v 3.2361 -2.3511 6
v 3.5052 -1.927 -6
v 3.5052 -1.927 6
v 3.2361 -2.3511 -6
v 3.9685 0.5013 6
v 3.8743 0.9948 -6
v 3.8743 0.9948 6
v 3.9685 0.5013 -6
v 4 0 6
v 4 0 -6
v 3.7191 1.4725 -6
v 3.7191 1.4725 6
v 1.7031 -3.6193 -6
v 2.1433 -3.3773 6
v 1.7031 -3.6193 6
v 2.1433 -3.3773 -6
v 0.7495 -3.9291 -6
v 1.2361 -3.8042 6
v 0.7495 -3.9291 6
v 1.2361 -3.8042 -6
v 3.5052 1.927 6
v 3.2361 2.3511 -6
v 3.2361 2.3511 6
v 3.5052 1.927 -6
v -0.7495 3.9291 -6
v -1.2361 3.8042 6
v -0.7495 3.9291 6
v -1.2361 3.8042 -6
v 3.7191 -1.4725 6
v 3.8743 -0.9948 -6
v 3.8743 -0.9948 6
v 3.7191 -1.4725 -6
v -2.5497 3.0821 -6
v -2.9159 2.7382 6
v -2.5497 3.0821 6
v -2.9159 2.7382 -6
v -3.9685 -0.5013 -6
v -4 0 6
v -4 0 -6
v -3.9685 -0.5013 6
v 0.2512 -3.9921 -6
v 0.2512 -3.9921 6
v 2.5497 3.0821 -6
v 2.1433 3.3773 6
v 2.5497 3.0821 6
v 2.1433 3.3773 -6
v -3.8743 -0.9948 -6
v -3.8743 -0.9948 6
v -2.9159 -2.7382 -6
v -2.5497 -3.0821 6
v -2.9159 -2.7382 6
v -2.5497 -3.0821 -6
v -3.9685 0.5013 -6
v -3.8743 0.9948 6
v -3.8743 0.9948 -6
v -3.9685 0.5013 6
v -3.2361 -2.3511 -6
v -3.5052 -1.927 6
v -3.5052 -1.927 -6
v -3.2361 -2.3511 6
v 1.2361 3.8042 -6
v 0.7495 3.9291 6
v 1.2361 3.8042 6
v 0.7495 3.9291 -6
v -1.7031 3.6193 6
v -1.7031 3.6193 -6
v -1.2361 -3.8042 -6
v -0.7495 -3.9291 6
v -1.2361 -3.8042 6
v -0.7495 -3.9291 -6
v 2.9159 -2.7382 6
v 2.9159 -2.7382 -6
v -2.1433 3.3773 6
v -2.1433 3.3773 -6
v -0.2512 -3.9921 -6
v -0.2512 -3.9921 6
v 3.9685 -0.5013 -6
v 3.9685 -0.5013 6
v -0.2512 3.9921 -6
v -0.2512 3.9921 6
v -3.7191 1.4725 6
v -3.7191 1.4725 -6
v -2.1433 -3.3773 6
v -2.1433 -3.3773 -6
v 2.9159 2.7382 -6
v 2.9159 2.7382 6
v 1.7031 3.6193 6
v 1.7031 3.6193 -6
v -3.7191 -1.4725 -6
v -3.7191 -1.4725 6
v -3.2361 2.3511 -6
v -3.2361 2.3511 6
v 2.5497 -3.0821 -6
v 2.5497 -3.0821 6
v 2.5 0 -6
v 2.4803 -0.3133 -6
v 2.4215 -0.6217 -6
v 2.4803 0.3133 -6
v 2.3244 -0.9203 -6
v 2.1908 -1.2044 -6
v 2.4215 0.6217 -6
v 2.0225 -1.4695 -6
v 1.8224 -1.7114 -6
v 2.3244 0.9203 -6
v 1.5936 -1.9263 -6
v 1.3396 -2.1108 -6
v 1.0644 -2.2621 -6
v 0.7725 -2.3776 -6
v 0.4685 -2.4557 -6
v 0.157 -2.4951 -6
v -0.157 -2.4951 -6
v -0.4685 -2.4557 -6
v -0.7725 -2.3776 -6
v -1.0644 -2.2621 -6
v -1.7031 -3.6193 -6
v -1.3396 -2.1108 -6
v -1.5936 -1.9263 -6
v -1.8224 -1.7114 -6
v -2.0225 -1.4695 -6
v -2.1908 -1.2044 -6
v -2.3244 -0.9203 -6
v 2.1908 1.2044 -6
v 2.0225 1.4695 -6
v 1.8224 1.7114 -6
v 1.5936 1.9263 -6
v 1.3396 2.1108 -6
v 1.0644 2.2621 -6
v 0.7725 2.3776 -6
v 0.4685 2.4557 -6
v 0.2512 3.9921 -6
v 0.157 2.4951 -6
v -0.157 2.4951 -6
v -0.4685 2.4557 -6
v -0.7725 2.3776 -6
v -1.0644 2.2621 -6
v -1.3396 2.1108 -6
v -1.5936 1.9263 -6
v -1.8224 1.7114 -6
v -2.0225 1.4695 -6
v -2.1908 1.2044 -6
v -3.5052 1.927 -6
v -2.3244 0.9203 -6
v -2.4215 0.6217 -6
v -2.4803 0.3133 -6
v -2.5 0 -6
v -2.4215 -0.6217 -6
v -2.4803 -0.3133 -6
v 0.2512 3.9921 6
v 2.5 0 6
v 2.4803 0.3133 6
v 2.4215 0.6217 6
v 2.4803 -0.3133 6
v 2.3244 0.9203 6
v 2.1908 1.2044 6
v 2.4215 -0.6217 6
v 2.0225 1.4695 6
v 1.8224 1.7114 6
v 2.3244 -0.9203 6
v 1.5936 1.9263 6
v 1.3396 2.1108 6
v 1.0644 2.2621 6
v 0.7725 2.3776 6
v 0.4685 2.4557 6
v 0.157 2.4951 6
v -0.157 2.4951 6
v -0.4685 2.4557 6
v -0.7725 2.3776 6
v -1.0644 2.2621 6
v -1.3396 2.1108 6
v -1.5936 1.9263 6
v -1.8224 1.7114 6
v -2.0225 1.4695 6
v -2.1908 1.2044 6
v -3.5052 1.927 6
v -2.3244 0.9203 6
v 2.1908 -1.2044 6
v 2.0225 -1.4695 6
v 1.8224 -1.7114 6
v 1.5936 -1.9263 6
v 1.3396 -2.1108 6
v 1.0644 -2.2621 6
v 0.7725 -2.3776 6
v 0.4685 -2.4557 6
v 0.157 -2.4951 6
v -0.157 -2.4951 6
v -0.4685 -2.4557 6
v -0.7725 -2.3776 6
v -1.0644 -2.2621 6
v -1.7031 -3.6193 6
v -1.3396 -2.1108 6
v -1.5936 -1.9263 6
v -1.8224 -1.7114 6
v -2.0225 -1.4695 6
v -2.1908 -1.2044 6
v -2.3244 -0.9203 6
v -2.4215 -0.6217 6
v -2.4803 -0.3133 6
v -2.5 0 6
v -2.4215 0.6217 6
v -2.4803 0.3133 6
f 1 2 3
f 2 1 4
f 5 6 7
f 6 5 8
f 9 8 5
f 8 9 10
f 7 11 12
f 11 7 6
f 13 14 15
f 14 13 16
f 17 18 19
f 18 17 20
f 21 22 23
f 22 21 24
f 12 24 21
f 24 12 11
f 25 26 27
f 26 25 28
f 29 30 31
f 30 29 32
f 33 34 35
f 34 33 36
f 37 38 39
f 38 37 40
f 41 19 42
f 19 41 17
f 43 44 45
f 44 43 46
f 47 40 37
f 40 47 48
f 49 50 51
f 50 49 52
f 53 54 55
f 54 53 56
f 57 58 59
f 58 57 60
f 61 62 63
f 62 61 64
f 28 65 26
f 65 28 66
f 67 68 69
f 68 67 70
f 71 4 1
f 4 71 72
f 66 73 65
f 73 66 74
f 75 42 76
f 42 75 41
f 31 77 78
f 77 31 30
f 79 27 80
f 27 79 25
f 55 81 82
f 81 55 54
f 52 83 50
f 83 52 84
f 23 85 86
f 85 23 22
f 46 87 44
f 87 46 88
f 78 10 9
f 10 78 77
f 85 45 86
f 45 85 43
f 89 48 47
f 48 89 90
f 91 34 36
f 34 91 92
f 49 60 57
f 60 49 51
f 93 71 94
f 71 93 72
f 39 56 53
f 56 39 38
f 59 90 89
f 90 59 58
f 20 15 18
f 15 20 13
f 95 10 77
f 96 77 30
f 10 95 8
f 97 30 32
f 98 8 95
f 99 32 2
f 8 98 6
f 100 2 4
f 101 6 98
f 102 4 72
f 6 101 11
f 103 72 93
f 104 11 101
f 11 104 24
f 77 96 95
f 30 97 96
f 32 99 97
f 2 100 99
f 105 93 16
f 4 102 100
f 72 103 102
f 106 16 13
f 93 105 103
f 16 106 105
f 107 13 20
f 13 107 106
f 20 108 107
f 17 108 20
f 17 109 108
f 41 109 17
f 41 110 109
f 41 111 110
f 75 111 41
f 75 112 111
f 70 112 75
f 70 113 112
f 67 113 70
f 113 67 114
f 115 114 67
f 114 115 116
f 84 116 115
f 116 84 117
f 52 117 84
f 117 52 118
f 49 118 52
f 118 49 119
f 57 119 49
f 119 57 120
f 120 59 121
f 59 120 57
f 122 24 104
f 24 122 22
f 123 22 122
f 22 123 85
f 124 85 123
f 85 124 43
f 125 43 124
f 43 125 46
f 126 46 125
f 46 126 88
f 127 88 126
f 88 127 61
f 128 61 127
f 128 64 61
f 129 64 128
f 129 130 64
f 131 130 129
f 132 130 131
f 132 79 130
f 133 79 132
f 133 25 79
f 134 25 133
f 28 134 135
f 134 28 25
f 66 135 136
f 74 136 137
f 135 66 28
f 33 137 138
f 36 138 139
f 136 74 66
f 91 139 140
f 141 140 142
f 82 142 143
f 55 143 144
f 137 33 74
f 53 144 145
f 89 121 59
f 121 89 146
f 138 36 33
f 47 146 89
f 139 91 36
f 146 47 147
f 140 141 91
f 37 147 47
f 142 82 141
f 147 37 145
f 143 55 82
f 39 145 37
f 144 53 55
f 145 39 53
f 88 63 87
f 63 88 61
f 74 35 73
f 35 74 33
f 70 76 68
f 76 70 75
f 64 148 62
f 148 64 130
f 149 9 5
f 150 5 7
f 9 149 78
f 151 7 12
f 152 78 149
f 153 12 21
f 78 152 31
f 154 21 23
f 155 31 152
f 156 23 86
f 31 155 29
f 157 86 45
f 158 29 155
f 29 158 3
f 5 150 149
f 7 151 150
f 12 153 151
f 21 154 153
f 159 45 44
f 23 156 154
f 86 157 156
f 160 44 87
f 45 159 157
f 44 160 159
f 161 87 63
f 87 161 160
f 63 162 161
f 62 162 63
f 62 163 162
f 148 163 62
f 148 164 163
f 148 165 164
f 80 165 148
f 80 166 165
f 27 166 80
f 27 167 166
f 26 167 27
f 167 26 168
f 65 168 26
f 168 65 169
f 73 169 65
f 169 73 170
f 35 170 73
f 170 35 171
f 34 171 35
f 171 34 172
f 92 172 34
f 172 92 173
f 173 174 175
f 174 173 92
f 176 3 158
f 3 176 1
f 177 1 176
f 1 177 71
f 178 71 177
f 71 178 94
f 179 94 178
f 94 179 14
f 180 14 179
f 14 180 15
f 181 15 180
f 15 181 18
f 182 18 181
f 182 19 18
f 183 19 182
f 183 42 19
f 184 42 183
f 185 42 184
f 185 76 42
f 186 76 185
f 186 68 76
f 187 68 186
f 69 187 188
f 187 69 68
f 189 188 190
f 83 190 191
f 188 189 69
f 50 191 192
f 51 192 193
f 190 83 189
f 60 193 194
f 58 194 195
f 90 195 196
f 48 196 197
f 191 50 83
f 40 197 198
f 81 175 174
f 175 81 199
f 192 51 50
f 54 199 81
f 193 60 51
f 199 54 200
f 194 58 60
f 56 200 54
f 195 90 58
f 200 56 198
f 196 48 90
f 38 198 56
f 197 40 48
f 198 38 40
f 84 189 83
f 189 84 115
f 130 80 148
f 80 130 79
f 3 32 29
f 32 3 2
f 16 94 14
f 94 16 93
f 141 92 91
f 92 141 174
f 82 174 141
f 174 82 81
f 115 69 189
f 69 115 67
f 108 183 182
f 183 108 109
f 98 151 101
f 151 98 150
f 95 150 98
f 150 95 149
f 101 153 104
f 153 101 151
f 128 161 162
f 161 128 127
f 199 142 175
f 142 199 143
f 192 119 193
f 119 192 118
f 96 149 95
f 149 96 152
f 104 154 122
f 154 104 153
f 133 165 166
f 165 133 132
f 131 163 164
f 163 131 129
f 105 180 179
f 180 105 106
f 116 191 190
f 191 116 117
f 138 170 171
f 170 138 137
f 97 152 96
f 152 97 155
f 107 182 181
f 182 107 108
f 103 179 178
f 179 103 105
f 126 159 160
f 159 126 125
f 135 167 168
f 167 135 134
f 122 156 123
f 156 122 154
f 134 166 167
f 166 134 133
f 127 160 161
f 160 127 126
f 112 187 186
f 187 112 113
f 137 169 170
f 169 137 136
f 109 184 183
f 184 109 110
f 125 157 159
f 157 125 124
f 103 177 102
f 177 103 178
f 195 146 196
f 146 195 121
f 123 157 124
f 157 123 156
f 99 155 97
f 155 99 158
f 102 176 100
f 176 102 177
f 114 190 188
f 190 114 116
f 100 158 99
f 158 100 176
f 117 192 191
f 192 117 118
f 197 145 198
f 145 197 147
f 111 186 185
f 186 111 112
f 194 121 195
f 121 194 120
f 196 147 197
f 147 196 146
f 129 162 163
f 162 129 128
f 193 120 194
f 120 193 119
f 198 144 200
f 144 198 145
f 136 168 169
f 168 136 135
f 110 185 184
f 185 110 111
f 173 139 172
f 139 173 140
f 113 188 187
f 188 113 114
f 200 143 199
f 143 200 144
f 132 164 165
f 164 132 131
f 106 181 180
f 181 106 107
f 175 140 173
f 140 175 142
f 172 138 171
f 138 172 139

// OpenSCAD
$fn = 50;


difference() {
	union() {
		translate(v = [0, 0, -6.0000000000]) {
			cylinder(h = 12, r = 4.0000000000);
		}
	}
	union() {
		translate(v = [0, 0, -100.0000000000]) {
			cylinder(h = 200, r = 2.5000000000);
		}
	}
}
